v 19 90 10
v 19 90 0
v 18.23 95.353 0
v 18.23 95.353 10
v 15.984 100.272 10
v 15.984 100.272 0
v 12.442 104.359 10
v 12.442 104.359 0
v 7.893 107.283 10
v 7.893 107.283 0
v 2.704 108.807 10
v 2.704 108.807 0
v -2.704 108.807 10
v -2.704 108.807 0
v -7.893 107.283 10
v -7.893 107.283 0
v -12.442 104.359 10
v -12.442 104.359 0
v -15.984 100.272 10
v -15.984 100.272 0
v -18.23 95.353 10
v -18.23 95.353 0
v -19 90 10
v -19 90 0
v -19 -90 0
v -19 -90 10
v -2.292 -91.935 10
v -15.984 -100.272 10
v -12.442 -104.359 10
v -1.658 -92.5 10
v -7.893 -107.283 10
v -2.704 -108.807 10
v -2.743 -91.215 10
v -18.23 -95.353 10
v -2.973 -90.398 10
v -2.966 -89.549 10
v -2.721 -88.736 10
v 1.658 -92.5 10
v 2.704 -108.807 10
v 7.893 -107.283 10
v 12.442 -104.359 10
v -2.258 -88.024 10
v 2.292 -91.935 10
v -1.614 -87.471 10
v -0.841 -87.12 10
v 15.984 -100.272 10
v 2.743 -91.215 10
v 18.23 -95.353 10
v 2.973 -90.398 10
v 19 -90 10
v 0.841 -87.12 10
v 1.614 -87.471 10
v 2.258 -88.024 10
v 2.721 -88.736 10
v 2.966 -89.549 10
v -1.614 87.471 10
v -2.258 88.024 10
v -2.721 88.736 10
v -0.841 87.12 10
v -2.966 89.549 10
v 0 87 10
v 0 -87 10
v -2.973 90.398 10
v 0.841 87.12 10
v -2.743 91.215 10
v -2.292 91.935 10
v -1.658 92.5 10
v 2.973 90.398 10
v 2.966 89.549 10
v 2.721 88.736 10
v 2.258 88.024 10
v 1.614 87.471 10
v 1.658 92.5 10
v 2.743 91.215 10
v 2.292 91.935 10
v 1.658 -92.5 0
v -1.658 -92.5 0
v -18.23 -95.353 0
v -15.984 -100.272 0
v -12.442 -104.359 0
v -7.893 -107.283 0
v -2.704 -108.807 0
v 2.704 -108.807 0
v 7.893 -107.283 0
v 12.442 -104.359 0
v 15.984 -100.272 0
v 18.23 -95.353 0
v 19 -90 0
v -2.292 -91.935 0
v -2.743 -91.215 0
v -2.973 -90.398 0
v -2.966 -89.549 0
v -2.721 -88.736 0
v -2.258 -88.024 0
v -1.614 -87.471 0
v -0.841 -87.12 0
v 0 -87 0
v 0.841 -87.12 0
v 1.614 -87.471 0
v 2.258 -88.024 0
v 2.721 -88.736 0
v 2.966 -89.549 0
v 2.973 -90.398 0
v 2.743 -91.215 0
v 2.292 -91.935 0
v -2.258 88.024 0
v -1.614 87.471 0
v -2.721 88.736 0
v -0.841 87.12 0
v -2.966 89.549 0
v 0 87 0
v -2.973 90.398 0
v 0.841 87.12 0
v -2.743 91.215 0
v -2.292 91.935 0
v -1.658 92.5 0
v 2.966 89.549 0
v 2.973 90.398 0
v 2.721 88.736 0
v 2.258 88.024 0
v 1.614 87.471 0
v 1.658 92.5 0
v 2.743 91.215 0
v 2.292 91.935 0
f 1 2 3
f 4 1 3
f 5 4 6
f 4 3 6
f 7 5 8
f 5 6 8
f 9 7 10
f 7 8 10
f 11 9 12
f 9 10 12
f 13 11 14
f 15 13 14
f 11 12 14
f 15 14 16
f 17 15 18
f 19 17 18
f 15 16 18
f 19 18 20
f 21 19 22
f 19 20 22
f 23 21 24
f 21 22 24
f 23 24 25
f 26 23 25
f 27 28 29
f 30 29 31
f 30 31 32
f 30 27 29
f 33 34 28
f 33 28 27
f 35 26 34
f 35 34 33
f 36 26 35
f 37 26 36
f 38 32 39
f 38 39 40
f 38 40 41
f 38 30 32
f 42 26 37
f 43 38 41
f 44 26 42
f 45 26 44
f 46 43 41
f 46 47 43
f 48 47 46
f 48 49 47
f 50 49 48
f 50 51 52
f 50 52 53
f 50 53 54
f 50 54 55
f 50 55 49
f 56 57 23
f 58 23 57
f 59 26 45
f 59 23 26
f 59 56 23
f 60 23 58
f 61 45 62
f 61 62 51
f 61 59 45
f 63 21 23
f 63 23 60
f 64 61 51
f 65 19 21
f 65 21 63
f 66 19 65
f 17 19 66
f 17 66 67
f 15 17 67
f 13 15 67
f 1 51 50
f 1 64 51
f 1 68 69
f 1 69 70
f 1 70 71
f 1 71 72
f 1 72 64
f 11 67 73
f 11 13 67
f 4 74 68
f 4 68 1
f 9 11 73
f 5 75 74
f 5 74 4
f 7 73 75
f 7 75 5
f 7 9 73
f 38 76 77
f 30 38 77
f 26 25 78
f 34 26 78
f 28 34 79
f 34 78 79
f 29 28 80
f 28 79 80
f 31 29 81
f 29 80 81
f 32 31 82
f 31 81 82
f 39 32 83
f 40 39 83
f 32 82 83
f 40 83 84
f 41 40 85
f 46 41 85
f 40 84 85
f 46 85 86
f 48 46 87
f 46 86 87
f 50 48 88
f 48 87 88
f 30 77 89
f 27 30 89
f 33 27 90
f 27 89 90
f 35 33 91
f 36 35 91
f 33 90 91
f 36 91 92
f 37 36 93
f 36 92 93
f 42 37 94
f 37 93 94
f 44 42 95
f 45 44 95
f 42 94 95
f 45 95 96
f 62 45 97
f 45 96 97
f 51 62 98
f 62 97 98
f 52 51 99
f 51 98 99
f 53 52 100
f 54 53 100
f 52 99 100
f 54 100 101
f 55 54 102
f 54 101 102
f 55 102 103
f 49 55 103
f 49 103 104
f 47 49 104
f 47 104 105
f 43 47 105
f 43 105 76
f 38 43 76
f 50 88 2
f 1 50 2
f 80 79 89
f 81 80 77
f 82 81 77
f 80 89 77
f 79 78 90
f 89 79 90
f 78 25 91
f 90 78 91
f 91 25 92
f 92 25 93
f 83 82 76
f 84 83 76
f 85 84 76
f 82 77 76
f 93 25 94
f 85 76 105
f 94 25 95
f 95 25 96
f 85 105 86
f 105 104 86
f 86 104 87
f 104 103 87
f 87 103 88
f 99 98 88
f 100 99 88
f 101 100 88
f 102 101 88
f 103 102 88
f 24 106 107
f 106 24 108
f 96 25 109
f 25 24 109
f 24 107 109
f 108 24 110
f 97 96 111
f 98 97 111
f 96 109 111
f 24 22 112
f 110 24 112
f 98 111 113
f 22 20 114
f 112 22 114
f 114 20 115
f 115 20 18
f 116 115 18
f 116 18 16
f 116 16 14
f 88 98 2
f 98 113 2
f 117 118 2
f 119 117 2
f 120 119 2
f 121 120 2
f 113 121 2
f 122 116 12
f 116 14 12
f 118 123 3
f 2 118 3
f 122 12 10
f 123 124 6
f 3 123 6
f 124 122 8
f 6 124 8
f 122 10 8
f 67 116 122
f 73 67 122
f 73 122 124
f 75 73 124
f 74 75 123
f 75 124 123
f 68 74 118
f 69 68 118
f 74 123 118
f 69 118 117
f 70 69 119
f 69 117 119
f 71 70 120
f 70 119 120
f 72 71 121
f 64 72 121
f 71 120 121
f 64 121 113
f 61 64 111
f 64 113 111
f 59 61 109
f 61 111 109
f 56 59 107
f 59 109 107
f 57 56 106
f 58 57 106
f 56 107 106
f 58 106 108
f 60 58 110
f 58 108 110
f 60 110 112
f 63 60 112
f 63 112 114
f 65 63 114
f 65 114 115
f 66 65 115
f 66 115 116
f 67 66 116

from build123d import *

# Parameters (mm, degrees)
EXTRUDE_1_DEPTH = 10


with BuildPart() as part:
    # 草图1 → 凸台-拉伸1 (new body)
    with BuildSketch(Plane.XY):
        with BuildLine():
            Line((19, -90), (19, 90))
            ThreePointArc((19, 90), (0, 109), (-19, 90))
            Line((-19, 90), (-19, -90))
            ThreePointArc((-19, -90), (0, -109), (19, -90))
        make_face()
        with BuildLine():
            ThreePointArc((-1.658312395, -92.5), (0, -87), (1.658312395, -92.5))
            Line((1.658312395, -92.5), (-1.658312395, -92.5))
        make_face(mode=Mode.SUBTRACT)
        with BuildLine():
            Line((-1.658312395, 92.5), (1.658312395, 92.5))
            ThreePointArc((1.658312395, 92.5), (0, 87), (-1.658312395, 92.5))
        make_face(mode=Mode.SUBTRACT)
    extrude(amount=EXTRUDE_1_DEPTH)


solid = part.part
